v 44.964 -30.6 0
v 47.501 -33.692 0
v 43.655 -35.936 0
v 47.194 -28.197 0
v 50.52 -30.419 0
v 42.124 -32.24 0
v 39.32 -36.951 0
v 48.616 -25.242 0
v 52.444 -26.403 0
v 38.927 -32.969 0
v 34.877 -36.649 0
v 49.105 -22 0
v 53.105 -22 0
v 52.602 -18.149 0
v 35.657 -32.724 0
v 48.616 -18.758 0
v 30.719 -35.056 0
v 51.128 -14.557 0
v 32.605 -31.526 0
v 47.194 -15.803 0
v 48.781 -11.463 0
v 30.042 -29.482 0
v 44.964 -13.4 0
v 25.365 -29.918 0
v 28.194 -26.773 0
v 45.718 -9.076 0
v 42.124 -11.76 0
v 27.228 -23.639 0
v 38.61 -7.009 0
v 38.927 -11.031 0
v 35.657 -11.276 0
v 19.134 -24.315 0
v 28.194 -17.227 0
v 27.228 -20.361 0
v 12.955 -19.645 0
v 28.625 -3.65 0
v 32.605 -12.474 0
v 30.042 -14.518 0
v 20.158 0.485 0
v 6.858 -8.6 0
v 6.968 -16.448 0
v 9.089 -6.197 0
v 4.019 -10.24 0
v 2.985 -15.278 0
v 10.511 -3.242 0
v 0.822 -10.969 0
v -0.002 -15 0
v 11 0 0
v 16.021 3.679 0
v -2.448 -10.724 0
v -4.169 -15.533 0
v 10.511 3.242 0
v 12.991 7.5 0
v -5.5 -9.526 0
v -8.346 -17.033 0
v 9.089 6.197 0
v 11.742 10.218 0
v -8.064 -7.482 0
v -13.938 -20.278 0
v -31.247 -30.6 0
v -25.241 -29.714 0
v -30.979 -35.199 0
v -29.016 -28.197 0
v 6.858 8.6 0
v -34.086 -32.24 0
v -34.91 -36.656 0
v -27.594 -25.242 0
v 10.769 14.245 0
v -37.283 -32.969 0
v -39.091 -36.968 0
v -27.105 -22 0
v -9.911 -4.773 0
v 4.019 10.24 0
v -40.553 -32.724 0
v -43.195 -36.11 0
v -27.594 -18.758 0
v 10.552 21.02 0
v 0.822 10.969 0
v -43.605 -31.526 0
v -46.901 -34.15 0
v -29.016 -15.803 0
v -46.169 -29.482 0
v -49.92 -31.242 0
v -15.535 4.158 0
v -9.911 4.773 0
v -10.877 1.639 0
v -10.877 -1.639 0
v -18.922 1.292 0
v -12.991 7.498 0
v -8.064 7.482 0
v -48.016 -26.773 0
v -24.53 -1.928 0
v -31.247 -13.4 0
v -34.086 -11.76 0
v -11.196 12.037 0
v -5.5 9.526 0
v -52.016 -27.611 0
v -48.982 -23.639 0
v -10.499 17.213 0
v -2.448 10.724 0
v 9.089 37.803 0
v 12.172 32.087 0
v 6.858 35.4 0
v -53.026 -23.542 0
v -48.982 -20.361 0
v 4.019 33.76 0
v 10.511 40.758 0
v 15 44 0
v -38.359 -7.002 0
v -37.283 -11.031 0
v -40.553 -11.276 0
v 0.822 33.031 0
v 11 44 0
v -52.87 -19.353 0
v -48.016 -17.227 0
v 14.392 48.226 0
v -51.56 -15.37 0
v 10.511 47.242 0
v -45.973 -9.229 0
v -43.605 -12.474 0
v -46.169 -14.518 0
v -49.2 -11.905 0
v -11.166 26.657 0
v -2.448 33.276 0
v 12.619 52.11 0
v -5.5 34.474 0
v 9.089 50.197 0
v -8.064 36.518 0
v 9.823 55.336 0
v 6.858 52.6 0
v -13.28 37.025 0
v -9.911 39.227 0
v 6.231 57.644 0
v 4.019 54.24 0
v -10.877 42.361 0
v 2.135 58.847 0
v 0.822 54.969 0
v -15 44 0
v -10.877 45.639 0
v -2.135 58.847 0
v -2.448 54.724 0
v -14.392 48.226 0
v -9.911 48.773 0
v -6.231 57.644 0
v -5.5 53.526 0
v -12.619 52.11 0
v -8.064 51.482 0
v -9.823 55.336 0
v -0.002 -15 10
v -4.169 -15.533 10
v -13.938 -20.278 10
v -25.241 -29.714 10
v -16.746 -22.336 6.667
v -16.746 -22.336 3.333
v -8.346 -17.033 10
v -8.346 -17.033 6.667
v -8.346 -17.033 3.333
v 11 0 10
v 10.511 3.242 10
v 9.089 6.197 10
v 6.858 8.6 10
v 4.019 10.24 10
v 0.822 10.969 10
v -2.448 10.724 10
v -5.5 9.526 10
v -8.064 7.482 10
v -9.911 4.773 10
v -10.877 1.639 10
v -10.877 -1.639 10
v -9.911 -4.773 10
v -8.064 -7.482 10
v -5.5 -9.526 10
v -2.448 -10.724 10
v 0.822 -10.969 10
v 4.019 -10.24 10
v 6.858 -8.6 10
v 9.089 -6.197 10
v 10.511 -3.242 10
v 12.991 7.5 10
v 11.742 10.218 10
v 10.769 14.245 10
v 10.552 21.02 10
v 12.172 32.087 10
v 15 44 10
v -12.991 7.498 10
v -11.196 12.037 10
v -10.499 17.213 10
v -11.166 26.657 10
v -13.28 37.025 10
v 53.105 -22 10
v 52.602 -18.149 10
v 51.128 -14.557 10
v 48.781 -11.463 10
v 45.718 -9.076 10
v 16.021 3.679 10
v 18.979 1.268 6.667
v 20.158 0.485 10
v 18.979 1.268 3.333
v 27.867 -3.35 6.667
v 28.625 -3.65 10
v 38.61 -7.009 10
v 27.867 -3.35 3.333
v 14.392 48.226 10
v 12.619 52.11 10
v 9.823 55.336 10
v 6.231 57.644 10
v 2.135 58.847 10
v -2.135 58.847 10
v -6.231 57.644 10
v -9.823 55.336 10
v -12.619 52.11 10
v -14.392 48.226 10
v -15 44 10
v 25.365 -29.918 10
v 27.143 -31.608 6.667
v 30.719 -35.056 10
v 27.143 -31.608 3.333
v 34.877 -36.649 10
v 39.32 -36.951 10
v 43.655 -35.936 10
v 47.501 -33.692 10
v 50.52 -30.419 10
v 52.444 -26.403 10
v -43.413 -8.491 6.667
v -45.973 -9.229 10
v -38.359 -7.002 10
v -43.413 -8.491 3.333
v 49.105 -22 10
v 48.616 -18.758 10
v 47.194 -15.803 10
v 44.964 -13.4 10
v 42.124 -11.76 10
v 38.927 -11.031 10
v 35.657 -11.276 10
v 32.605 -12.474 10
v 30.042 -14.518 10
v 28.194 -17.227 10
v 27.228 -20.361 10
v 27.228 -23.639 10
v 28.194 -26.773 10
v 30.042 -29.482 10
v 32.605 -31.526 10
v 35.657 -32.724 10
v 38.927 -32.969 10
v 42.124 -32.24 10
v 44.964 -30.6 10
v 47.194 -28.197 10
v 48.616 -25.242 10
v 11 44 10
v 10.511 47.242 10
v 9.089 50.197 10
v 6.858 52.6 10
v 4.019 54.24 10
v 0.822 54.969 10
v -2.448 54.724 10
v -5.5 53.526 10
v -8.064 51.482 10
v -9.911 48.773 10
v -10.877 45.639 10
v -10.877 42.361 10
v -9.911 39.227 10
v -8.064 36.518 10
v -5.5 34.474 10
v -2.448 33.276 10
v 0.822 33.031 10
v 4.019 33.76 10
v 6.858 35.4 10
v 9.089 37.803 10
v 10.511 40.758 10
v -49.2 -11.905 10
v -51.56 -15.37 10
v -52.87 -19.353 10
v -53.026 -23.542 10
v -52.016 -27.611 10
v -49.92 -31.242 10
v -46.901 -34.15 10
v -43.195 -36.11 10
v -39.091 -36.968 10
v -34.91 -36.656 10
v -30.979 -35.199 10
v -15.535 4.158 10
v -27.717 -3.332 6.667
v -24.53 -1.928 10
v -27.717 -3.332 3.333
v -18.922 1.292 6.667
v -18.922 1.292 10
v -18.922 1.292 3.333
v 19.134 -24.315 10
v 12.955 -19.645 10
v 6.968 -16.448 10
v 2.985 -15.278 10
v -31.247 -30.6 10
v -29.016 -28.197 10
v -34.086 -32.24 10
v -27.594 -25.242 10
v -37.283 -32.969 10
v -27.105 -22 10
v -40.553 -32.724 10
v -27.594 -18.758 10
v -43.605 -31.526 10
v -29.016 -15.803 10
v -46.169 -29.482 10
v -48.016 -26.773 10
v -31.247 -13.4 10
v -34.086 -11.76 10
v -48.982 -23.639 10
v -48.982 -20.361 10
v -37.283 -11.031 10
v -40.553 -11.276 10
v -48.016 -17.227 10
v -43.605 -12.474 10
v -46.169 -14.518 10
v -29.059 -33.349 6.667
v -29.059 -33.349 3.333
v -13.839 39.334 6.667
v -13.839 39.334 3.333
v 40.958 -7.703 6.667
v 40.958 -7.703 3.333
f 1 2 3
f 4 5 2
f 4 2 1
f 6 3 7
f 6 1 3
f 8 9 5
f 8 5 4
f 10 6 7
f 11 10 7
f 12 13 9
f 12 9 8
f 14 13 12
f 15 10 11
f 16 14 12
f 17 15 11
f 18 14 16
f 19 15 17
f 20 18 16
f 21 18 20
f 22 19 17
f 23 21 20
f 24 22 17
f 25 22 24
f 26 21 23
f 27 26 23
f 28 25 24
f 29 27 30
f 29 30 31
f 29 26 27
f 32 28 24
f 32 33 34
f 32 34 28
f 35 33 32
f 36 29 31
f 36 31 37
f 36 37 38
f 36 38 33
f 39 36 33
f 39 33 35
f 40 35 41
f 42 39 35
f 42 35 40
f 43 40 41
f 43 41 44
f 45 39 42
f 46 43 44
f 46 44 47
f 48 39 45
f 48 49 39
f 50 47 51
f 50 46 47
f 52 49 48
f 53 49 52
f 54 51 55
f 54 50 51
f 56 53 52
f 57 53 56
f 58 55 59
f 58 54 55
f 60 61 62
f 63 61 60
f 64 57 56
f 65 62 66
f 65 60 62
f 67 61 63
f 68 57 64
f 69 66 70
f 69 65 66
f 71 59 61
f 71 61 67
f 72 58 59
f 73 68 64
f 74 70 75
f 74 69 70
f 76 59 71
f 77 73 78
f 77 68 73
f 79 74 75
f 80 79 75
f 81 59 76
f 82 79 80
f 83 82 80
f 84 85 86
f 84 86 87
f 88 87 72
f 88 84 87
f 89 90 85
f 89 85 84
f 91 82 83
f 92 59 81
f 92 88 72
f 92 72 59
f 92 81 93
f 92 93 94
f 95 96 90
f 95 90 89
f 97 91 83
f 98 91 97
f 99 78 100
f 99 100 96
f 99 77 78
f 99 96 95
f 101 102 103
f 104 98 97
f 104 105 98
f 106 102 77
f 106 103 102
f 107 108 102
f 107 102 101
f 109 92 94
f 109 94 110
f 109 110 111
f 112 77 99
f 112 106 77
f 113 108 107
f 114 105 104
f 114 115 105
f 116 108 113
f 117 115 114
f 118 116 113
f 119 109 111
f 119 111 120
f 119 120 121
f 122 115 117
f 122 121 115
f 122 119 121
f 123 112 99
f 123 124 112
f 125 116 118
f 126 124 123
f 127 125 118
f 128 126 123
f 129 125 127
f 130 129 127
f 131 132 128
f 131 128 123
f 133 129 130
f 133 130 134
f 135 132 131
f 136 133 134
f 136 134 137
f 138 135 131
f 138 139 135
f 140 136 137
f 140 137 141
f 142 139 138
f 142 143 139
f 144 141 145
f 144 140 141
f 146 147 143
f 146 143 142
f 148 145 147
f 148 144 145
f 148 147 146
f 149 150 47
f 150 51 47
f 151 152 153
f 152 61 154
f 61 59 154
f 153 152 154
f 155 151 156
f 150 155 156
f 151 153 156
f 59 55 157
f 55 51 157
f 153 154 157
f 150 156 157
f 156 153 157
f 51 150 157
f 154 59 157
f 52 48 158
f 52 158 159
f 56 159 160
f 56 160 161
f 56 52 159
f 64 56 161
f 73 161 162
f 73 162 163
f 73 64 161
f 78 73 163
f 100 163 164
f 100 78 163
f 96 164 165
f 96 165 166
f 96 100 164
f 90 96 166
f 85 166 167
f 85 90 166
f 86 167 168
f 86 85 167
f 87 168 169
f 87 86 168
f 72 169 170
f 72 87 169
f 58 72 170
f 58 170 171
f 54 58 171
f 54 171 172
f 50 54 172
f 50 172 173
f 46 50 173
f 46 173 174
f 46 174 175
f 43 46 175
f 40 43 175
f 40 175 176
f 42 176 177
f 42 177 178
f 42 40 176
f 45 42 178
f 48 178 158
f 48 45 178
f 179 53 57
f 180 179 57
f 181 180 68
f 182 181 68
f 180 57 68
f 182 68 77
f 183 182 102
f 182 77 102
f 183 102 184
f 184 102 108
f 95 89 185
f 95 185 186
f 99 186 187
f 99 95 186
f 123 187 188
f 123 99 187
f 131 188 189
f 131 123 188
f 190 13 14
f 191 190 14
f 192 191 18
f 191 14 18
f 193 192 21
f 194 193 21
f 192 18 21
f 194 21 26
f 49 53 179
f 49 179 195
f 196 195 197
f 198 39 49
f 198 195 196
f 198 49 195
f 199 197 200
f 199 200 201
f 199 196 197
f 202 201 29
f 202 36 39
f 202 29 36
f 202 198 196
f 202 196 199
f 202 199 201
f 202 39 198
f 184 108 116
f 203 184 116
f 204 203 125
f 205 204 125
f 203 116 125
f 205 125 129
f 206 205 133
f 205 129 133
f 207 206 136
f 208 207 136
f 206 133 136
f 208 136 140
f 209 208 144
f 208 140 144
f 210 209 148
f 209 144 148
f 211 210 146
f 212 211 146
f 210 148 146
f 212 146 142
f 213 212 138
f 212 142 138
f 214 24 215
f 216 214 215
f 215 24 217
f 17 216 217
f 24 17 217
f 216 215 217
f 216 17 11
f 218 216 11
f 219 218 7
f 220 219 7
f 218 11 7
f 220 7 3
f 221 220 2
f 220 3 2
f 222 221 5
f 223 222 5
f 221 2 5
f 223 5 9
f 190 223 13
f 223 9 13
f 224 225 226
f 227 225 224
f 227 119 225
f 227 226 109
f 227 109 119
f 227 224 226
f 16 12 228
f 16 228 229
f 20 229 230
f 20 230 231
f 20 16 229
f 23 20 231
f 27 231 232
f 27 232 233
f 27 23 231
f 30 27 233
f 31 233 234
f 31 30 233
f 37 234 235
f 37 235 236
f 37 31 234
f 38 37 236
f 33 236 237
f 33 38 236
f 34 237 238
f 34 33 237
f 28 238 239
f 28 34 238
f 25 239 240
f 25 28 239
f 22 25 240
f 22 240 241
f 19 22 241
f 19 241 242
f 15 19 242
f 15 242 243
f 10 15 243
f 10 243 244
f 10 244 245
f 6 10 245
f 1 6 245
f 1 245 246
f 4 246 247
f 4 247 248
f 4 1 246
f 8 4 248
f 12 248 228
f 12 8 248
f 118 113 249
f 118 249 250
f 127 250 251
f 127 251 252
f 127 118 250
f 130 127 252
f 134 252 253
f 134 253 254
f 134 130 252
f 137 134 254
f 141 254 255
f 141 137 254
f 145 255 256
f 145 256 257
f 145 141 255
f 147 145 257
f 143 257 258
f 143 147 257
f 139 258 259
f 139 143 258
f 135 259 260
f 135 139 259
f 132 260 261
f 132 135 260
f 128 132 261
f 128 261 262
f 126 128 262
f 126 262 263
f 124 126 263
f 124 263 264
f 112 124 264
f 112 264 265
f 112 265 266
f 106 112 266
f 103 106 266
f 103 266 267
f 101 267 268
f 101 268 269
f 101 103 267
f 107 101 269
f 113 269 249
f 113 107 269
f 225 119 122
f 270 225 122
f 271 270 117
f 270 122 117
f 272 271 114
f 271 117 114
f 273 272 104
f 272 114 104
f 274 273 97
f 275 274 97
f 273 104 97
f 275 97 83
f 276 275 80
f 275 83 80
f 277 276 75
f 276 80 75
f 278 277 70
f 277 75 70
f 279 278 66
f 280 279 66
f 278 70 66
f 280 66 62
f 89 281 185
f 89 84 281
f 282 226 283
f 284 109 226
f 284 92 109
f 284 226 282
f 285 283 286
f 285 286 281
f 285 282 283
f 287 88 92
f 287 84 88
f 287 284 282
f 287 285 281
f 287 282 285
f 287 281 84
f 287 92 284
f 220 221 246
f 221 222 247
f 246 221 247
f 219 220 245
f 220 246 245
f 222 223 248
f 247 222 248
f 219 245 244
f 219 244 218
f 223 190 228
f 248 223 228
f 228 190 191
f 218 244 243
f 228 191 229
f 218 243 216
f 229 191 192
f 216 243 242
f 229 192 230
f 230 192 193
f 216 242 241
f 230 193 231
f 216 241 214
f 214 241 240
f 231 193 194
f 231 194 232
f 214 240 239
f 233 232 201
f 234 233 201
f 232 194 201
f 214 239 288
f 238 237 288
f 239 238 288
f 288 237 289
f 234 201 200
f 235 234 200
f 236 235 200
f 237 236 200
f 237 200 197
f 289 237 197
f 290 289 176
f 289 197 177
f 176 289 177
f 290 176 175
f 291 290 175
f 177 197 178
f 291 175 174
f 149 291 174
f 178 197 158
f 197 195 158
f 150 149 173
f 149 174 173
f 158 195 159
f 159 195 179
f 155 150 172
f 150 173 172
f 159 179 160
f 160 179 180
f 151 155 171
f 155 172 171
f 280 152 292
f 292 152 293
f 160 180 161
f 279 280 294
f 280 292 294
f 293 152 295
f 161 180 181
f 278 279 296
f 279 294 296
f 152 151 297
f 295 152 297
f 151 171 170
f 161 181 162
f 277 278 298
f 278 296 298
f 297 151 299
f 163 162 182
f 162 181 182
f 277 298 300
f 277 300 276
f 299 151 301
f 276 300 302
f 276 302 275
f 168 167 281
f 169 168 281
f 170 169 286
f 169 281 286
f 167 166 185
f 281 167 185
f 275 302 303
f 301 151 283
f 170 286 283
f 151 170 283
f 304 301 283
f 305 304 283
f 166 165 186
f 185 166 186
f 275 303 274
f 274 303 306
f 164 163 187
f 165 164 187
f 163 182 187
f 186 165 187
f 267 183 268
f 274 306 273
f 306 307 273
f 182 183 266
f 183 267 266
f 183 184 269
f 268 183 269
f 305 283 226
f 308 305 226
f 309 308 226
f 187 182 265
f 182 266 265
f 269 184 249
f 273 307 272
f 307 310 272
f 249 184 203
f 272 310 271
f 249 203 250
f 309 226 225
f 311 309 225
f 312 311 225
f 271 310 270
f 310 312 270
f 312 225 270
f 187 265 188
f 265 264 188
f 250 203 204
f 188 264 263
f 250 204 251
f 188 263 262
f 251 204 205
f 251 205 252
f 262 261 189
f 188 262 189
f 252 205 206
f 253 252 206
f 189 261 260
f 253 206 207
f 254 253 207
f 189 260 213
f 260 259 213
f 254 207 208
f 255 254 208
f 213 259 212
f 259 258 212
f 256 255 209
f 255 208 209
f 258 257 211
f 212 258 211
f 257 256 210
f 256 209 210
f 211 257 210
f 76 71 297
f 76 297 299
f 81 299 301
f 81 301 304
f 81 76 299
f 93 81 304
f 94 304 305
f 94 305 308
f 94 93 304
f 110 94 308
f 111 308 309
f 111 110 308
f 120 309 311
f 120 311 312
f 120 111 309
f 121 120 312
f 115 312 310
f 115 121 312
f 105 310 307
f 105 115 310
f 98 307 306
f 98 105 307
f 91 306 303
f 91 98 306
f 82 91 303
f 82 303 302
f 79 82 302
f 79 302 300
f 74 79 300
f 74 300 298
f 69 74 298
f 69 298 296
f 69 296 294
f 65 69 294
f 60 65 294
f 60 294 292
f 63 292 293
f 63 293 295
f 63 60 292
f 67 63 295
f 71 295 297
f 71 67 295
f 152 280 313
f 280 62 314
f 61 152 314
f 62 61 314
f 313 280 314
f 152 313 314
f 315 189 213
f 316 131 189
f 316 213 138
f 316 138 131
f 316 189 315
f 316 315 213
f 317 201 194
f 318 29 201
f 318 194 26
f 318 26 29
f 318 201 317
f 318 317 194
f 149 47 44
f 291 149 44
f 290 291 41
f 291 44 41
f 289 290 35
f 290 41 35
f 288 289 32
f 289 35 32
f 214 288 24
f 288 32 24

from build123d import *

# Parameters (mm, degrees)
F0_R     = 11
F1_DEPTH = 10


# Not quite as in the source:
# - ends of sketch curves that miss each other by under 0.0002 mm in the source are joined


with BuildPart() as f1:
    # F0 (on Top) → F1 (new body)
    with BuildSketch(Plane.XY):
        with BuildLine():
            add(Edge.make_bspline(
                [(-45.9731322266, -9.229160229), (-43.4071259384, -8.4900716571), (-40.8523723257, -7.7580834253), (-38.3590158595, -7.002148962)],
                knots=[0, 0, 0, 0, 0.0911278571, 0.0911278571, 0.0911278571, 0.0911278571], degree=3))
            ThreePointArc((-45.9731322266, -9.229160229), (-51.0954988233, -29.5), (-30.9792533273, -35.1993202853))
            add(Edge.make_bspline(
                [(-30.9792533273, -35.1993202853), (-29.0552189861, -33.3450108014), (-27.1429808317, -31.496831403), (-25.2406198636, -29.713928552)],
                knots=[0, 0, 0, 0, 0.0911399969, 0.0911399969, 0.0911399969, 0.0911399969], degree=3))
            ThreePointArc((-25.2406198636, -29.713928552), (-23.6488480446, -26.0020326995), (-23.1051177665, -22))
            ThreePointArc((-23.1051177665, -22), (-27.5886656888, -11.3040084285), (-38.3590158595, -7.002148962))
        make_face()
        with Locations((-38.1051177665, -22)):
            Circle(F0_R, mode=Mode.SUBTRACT)
        with BuildLine():
            add(Edge.make_bspline(
                [(-38.3590158595, -7.002148962), (-27.1330019101, -3.5986521316), (-17.1515902552, 0.2902668448), (-12.9914200153, 7.4981996163)],
                knots=[0.0911278571, 0.0911278571, 0.0911278571, 0.0911278571, 0.5014192088, 0.5014192088, 0.5014192088, 0.5014192088], degree=3))
            ThreePointArc((-38.3590158595, -7.002148962), (-27.5886656888, -11.3040084285), (-23.1051177665, -22))
            ThreePointArc((-23.1051177665, -22), (-23.6488480446, -26.0020326995), (-25.2406198636, -29.713928552))
            add(Edge.make_bspline(
                [(-25.2406198636, -29.713928552), (-16.6860428704, -21.6965333438), (-8.3311964125, -14.9991213274), (-0.001581884, -14.9999997526)],
                knots=[0.0911399969, 0.0911399969, 0.0911399969, 0.0911399969, 0.5009802604, 0.5009802604, 0.5009802604, 0.5009802604], degree=3))
            ThreePointArc((-0.001581884, -14.9999997526), (-12.9902568617, -7.5002151081), (-12.9914200153, 7.4981996163))
        make_face()
        with BuildLine():
            add(Edge.make_bspline(
                [(-12.9914200153, 7.4981996163), (-12.9910736554, 7.4987997212), (-8.7775182768, 14.8003583601), (-10.5373469555, 25.5076949363), (-13.2795920522, 37.0248702573)],
                knots=[0.5014192088, 0.5014192088, 0.5014192088, 0.5014192088, 0.5014533681, 0.9170240175, 0.9170240175, 0.9170240175, 0.9170240175], degree=3))
            ThreePointArc((-12.9914200153, 7.4981996163), (-0.000790756, 14.9999999792), (12.9906296223, 7.4995694554))
            add(Edge.make_bspline(
                [(13.2855190223, 37.0361659764), (10.5442311657, 25.5033031012), (8.7843940058, 14.7858120219), (12.9905467554, 7.4997129635), (12.9906296223, 7.4995694554)],
                knots=[0.082935592, 0.082935592, 0.082935592, 0.082935592, 0.499552834, 0.4995610405, 0.4995610405, 0.4995610405, 0.4995610405], degree=3))
            ThreePointArc((13.2855190223, 37.0361659764), (0.0063781315, 29.000001356), (-13.2795920522, 37.0248702573))
        make_face()
        with BuildLine():
            ThreePointArc((12.9906296223, 7.4995694554), (-0.000790756, 14.9999999792), (-12.9914202607, 7.498199758))
            ThreePointArc((-12.9914202607, 7.498199758), (-12.9902568617, -7.5002151081), (-0.001581884, -14.9999999166))
            ThreePointArc((-0.001581884, -14.9999999166), (10.6060424226, -10.6071609835), (15, 0))
            ThreePointArc((15, 0), (14.4889517277, 3.8820455732), (12.9906296223, 7.4995694554))
        make_face()
        Circle(F0_R, mode=Mode.SUBTRACT)
        with BuildLine():
            ThreePointArc((15, 0), (10.6060424226, -10.6071609835), (-0.001581884, -14.9999999166))
            add(Edge.make_bspline(
                [(-0.001581884, -14.9999999166), (-0.0010545892, -14.9999998083), (8.4030291654, -15.0013139041), (16.7814390471, -21.8215724341), (25.3649320041, -29.9175543408)],
                knots=[0.5009802604, 0.5009802604, 0.5009802604, 0.5009802604, 0.5010062047, 0.9144846967, 0.9144846967, 0.9144846967, 0.9144846967], degree=3))
            ThreePointArc((25.3649320041, -29.9175543408), (25.119350955, -14.4920135645), (38.6102651526, -7.008508209))
            add(Edge.make_bspline(
                [(12.9906296082, 7.4995694472), (17.1802492182, 0.2423799612), (27.2886260541, -3.6105886019), (38.6102651526, -7.008508209)],
                knots=[0.4995610405, 0.4995610405, 0.4995610405, 0.4995610405, 0.914537264, 0.914537264, 0.914537264, 0.914537264], degree=3))
            ThreePointArc((12.9906296082, 7.4995694472), (14.4889517277, 3.8820455732), (15, 0))
        make_face()
        with BuildLine():
            add(Edge.make_bspline(
                [(-13.2795920522, 37.0248702573), (-13.8271294721, 39.3244766884), (-14.4138387907, 41.6564041587), (-15, 44)],
                knots=[0.9170240175, 0.9170240175, 0.9170240175, 0.9170240175, 1, 1, 1, 1], degree=3))
            ThreePointArc((-13.2795920522, 37.0248702573), (0.0063781315, 29.000001356), (13.2855190223, 37.0361659764))
            add(Edge.make_bspline(
                [(15, 44), (14.4158248487, 41.6601580392), (13.8312245488, 39.3320018523), (13.2855190223, 37.0361659764)],
                knots=[0, 0, 0, 0, 0.082935592, 0.082935592, 0.082935592, 0.082935592], degree=3))
            ThreePointArc((15, 44), (0, 59), (-15, 44))
        make_face()
        with Locations((0, 44)):
            Circle(F0_R, mode=Mode.SUBTRACT)
        with BuildLine():
            ThreePointArc((38.6102651526, -7.008508209), (25.119350955, -14.4920135645), (25.3649320041, -29.9175543408))
            add(Edge.make_bspline(
                [(25.3649320041, -29.9175543408), (27.1401634065, -31.5919590833), (28.9241895579, -33.3209501687), (30.7190564774, -35.055500704)],
                knots=[0.9144846967, 0.9144846967, 0.9144846967, 0.9144846967, 1, 1, 1, 1], degree=3))
            ThreePointArc((30.7190564774, -35.055500704), (45.6618723829, -34.9574480384), (53.1051177665, -22))
            ThreePointArc((53.1051177665, -22), (51.1281832536, -14.5568981387), (45.7184823908, -9.0757329377))
            add(Edge.make_bspline(
                [(38.6102651526, -7.008508209), (40.9419126032, -7.7082965101), (43.3250191135, -8.3887844569), (45.7184823908, -9.0757329377)],
                knots=[0.914537264, 0.914537264, 0.914537264, 0.914537264, 1, 1, 1, 1], degree=3))
        make_face()
        with Locations((38.1051177665, -22)):
            Circle(F0_R, mode=Mode.SUBTRACT)
    extrude(amount=F1_DEPTH)


solid = f1.part
